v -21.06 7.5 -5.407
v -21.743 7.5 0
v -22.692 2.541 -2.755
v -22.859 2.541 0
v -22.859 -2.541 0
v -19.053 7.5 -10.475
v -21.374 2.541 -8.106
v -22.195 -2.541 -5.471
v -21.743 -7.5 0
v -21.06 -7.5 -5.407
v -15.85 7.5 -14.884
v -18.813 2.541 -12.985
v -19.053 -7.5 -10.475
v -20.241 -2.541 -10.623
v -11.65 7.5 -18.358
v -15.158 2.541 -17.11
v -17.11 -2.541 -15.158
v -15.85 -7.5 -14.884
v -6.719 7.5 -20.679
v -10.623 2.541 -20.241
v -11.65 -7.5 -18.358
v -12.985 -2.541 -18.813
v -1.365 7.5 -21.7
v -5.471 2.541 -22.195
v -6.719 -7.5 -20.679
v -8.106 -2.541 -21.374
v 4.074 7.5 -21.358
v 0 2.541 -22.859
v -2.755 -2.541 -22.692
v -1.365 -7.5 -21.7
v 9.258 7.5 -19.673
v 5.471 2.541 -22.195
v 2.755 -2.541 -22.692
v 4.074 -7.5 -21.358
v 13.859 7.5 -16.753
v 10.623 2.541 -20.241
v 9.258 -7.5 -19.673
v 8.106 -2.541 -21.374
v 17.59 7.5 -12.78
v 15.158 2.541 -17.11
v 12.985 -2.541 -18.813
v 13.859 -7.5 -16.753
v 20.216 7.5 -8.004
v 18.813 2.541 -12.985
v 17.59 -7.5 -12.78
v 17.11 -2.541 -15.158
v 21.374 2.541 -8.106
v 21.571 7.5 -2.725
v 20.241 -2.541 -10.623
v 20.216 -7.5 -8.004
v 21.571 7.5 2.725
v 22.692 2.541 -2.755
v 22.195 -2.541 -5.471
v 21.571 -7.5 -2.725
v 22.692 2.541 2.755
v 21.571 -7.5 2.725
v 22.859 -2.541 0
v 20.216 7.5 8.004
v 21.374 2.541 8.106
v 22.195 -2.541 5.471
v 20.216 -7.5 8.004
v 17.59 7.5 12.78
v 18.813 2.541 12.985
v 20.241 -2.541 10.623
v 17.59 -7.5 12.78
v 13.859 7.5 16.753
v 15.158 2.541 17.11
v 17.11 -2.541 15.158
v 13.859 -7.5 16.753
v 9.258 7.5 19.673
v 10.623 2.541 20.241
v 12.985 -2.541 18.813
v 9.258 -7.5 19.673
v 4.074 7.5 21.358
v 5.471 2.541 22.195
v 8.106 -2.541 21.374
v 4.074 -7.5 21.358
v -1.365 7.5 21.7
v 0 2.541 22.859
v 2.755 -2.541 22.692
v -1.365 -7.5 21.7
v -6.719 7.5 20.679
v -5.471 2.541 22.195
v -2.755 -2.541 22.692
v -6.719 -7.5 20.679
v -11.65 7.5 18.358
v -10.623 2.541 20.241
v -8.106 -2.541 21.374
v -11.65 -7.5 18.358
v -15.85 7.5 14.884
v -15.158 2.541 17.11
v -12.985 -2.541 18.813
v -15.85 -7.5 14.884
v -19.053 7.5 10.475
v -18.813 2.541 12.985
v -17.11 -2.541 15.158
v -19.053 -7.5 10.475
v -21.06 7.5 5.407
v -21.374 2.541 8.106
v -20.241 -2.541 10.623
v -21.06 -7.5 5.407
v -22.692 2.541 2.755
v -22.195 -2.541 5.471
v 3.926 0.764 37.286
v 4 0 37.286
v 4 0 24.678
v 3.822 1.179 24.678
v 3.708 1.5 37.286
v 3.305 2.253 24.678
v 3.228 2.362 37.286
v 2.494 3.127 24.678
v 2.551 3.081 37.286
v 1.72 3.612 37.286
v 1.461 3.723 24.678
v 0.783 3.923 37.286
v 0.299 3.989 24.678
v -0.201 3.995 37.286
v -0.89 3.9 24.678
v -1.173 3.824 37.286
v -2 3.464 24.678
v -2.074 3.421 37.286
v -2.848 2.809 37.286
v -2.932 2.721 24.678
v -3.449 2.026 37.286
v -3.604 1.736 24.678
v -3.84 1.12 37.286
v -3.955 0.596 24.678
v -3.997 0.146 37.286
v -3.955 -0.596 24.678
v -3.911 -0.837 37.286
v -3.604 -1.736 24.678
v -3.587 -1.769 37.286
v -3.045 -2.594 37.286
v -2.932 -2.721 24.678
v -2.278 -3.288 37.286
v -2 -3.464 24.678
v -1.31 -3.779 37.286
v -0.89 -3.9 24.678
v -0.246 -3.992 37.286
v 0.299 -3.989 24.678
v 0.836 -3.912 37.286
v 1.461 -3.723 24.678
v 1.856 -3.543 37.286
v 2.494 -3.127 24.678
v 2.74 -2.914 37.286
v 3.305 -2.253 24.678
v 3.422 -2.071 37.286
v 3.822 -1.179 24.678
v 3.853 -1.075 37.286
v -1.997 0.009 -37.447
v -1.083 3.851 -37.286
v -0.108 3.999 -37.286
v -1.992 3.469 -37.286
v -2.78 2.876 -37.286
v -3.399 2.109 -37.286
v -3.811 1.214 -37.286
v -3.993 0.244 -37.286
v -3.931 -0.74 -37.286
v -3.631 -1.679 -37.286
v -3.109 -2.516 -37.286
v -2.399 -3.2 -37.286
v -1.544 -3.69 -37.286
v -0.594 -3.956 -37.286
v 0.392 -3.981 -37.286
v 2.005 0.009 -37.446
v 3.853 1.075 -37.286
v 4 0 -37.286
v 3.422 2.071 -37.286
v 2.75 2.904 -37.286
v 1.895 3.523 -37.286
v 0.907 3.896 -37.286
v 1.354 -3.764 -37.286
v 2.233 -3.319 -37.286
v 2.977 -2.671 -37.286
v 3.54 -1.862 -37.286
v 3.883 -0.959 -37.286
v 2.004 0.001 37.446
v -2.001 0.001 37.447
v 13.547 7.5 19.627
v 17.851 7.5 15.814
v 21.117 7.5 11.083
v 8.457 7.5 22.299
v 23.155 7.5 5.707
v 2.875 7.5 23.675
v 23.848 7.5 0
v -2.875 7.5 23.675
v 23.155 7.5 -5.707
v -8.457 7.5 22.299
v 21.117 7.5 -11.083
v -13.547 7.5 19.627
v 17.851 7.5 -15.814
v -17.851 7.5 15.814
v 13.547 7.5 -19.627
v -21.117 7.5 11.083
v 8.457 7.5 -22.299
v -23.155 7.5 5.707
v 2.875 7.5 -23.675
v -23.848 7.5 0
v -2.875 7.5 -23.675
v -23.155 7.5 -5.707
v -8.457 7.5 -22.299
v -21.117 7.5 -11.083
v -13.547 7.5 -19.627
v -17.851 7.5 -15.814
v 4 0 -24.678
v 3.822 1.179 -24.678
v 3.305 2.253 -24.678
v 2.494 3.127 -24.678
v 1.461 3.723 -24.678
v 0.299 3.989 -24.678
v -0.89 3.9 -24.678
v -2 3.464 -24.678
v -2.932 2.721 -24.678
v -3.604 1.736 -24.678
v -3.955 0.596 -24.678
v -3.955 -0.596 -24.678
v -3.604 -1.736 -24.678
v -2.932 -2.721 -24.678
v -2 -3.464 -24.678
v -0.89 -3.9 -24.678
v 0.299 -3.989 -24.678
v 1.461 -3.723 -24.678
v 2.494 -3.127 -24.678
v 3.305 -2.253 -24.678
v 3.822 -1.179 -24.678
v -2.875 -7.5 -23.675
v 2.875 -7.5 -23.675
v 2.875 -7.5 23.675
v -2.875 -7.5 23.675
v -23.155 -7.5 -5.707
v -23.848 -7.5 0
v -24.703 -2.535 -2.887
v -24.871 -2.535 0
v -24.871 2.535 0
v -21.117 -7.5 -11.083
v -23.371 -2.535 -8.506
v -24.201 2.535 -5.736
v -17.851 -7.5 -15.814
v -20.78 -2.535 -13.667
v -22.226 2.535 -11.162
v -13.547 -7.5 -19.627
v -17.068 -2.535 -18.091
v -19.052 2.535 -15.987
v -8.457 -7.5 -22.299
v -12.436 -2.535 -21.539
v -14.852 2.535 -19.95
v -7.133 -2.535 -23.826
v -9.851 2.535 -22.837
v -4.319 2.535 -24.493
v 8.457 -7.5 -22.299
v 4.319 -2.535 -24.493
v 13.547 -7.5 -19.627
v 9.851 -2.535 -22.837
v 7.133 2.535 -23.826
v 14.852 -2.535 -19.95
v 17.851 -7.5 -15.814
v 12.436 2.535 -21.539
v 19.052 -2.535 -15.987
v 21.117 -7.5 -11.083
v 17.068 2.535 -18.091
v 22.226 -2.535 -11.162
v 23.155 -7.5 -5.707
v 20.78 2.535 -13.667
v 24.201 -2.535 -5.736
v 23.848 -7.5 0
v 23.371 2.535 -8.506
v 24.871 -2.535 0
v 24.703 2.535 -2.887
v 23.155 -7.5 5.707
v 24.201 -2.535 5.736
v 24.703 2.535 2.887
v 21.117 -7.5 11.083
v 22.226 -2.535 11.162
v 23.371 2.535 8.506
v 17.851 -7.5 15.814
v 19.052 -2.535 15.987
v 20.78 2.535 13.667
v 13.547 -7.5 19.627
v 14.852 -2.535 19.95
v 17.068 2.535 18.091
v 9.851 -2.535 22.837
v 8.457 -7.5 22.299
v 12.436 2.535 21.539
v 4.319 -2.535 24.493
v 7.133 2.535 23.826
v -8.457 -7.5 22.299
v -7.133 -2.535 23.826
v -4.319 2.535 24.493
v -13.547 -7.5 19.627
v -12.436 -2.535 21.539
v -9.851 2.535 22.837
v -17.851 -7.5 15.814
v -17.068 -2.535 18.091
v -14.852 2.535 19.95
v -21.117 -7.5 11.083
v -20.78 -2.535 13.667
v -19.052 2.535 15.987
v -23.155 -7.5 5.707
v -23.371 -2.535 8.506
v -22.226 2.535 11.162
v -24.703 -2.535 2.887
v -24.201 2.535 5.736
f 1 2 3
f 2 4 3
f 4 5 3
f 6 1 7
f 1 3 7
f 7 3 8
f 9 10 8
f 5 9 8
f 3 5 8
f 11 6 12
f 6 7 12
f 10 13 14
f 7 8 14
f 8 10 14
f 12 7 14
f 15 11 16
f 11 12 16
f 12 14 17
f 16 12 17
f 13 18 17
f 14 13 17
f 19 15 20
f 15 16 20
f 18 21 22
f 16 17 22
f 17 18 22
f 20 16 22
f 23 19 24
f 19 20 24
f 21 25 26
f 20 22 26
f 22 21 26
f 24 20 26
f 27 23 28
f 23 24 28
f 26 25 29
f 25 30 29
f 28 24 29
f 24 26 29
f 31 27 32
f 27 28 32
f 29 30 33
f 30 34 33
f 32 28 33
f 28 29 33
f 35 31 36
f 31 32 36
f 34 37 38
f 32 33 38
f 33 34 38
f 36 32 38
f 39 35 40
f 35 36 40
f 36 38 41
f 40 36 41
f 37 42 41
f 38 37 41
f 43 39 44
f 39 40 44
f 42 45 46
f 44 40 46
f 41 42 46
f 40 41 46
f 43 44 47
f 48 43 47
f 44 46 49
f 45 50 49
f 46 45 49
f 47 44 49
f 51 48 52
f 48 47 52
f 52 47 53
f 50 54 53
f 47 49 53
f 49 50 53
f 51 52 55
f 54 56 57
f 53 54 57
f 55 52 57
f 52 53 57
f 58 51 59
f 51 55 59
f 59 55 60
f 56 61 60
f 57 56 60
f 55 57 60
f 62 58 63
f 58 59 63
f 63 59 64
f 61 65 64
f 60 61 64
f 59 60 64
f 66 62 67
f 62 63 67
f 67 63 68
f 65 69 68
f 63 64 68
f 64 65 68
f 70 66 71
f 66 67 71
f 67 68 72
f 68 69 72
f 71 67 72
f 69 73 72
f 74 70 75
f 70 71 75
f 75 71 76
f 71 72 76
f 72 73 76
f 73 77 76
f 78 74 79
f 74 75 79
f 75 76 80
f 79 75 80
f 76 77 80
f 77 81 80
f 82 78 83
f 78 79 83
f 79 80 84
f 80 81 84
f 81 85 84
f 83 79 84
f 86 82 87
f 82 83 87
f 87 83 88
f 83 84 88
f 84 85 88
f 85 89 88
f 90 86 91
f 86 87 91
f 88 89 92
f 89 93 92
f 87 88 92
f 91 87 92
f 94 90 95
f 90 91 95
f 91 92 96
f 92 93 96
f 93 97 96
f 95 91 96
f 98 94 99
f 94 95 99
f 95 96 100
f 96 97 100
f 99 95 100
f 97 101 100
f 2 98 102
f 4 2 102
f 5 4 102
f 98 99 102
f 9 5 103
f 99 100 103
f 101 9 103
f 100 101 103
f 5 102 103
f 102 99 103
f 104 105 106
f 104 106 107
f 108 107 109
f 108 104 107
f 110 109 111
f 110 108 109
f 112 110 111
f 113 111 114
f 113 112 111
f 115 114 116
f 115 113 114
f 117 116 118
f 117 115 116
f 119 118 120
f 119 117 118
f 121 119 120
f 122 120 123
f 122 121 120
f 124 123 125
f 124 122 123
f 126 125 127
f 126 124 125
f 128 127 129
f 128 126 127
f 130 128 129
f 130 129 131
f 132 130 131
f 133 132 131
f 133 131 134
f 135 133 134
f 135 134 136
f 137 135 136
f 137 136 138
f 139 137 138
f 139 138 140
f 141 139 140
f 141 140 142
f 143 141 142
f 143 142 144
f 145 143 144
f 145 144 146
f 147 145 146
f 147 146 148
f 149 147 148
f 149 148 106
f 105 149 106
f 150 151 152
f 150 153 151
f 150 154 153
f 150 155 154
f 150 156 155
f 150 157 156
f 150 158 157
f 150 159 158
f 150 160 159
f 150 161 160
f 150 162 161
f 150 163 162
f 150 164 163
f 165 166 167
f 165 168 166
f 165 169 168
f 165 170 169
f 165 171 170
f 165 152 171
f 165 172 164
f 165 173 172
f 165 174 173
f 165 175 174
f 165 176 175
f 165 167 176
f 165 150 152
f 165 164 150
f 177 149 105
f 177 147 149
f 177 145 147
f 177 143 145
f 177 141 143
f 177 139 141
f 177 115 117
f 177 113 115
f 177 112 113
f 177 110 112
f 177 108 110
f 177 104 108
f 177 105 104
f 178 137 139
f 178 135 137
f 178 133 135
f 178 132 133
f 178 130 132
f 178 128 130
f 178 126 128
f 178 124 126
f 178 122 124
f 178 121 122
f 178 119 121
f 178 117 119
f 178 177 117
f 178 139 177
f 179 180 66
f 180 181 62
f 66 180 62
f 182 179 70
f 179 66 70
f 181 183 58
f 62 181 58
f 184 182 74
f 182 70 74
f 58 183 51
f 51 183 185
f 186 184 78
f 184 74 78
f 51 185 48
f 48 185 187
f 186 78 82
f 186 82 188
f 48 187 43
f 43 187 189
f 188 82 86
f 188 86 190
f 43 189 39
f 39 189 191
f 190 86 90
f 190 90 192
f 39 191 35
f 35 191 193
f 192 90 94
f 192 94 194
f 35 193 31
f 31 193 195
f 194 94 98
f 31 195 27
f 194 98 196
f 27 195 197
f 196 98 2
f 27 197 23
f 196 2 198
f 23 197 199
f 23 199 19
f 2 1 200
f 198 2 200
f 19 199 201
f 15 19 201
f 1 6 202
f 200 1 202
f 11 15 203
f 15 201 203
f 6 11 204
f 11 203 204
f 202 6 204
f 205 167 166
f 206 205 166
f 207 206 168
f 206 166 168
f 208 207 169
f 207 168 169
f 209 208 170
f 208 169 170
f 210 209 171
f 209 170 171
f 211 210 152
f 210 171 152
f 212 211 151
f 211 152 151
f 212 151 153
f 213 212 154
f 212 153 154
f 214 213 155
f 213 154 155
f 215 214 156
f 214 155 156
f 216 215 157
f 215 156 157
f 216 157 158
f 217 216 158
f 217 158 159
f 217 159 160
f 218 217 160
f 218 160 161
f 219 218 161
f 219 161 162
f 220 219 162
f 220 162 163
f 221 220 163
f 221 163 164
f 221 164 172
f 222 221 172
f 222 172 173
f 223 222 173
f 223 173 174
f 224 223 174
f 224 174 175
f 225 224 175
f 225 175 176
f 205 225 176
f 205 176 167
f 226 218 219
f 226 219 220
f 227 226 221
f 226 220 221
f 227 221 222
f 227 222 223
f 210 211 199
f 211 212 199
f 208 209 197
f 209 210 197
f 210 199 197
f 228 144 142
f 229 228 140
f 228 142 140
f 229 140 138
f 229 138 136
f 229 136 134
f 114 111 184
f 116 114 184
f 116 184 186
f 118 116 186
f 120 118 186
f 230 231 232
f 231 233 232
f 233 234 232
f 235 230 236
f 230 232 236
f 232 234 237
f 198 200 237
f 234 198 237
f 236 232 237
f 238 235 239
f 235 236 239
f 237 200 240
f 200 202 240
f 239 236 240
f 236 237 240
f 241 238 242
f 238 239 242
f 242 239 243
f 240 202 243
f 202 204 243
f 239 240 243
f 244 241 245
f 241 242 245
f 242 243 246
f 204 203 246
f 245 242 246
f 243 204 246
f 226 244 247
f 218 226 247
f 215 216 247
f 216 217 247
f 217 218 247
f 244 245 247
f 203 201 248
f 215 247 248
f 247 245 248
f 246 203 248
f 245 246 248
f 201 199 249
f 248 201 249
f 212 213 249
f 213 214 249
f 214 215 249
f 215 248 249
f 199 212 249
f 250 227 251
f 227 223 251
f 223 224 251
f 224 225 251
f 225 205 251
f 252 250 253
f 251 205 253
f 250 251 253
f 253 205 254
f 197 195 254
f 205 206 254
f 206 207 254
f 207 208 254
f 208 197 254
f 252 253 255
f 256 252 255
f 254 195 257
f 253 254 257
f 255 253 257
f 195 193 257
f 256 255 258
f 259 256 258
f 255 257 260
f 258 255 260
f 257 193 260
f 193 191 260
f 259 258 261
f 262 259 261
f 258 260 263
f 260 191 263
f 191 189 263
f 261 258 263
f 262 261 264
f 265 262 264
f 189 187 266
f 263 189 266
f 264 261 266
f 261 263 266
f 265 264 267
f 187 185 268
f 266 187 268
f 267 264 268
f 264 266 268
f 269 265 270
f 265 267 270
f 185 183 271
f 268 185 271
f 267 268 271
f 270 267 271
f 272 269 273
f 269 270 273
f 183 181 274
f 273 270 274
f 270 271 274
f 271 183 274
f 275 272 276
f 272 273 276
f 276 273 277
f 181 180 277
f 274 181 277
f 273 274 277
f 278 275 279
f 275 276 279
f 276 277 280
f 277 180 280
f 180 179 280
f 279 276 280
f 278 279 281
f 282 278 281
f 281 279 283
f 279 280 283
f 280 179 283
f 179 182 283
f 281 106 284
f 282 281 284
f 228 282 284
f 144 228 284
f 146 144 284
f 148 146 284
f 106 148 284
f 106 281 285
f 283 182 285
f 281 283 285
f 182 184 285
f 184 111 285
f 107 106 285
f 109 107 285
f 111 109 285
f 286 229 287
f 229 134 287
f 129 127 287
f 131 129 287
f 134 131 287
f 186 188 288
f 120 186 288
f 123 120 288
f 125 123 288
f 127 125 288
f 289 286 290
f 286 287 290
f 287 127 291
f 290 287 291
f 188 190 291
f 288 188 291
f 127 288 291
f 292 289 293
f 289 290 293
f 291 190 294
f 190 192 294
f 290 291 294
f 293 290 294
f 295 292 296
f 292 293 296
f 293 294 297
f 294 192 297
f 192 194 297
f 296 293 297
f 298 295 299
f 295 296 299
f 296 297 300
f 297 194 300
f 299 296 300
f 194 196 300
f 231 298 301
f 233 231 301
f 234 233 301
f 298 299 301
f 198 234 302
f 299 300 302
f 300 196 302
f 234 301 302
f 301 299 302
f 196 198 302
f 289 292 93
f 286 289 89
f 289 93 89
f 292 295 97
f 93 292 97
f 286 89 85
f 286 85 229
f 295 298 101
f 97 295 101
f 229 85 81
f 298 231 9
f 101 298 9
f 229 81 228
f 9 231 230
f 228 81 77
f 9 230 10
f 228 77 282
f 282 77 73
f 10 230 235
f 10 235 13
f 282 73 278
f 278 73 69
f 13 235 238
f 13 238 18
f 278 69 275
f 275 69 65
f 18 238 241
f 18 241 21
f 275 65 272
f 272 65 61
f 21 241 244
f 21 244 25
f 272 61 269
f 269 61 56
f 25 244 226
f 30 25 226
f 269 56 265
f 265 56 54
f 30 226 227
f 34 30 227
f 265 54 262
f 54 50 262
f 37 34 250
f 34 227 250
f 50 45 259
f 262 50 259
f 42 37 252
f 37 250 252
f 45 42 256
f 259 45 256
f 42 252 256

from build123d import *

# Parameters (mm, degrees)
SKETCH3_R           = 4
BOSS_EXTRUDE1_DEPTH = 12.822075


with BuildPart() as part:
    # Sketch1 → Revolve1 (revolve)
    with BuildSketch(Plane.XY):
        with BuildLine():
            Line((-23.848480035, 7.5), (-21.742814905, 7.5))
            ThreePointArc((-21.742814905, 7.5), (-23, 0), (-21.742814905, -7.5))
            Line((-21.742814905, -7.5), (-23.848480035, -7.5))
            ThreePointArc((-23.848480035, -7.5), (-25, 0), (-23.848480035, 7.5))
        make_face()
    revolve(axis=Axis((0, 8.20070368, 0), (0, -1, 0)))

    # Sketch3 → Boss-Extrude1 (add)
    with BuildSketch(Plane.XY.offset(37.5)):
        Circle(SKETCH3_R)
    boss_extrude1 = extrude(amount=-BOSS_EXTRUDE1_DEPTH)

    # Mirror1: Boss-Extrude1 across plane
    add(boss_extrude1.mirror(Plane.XY))

    # Sketch4 → Cut-Revolve1 (revolve, cut)
    with BuildSketch(Plane(origin=(0, 0, 0), x_dir=(0, 0, -1), z_dir=(1, 0, 0))):
        with BuildLine():
            Line((0, 40), (0, 37.5))
            ThreePointArc((0, 37.5), (-37.5, 0), (0, -37.5))
            Line((0, -37.5), (0, -40))
            ThreePointArc((0, -40), (-40, 0), (0, 40))
        make_face()
    revolve(axis=Axis((0, 37.5, 0), (0, -1, 0)), mode=Mode.SUBTRACT)


solid = part.part
